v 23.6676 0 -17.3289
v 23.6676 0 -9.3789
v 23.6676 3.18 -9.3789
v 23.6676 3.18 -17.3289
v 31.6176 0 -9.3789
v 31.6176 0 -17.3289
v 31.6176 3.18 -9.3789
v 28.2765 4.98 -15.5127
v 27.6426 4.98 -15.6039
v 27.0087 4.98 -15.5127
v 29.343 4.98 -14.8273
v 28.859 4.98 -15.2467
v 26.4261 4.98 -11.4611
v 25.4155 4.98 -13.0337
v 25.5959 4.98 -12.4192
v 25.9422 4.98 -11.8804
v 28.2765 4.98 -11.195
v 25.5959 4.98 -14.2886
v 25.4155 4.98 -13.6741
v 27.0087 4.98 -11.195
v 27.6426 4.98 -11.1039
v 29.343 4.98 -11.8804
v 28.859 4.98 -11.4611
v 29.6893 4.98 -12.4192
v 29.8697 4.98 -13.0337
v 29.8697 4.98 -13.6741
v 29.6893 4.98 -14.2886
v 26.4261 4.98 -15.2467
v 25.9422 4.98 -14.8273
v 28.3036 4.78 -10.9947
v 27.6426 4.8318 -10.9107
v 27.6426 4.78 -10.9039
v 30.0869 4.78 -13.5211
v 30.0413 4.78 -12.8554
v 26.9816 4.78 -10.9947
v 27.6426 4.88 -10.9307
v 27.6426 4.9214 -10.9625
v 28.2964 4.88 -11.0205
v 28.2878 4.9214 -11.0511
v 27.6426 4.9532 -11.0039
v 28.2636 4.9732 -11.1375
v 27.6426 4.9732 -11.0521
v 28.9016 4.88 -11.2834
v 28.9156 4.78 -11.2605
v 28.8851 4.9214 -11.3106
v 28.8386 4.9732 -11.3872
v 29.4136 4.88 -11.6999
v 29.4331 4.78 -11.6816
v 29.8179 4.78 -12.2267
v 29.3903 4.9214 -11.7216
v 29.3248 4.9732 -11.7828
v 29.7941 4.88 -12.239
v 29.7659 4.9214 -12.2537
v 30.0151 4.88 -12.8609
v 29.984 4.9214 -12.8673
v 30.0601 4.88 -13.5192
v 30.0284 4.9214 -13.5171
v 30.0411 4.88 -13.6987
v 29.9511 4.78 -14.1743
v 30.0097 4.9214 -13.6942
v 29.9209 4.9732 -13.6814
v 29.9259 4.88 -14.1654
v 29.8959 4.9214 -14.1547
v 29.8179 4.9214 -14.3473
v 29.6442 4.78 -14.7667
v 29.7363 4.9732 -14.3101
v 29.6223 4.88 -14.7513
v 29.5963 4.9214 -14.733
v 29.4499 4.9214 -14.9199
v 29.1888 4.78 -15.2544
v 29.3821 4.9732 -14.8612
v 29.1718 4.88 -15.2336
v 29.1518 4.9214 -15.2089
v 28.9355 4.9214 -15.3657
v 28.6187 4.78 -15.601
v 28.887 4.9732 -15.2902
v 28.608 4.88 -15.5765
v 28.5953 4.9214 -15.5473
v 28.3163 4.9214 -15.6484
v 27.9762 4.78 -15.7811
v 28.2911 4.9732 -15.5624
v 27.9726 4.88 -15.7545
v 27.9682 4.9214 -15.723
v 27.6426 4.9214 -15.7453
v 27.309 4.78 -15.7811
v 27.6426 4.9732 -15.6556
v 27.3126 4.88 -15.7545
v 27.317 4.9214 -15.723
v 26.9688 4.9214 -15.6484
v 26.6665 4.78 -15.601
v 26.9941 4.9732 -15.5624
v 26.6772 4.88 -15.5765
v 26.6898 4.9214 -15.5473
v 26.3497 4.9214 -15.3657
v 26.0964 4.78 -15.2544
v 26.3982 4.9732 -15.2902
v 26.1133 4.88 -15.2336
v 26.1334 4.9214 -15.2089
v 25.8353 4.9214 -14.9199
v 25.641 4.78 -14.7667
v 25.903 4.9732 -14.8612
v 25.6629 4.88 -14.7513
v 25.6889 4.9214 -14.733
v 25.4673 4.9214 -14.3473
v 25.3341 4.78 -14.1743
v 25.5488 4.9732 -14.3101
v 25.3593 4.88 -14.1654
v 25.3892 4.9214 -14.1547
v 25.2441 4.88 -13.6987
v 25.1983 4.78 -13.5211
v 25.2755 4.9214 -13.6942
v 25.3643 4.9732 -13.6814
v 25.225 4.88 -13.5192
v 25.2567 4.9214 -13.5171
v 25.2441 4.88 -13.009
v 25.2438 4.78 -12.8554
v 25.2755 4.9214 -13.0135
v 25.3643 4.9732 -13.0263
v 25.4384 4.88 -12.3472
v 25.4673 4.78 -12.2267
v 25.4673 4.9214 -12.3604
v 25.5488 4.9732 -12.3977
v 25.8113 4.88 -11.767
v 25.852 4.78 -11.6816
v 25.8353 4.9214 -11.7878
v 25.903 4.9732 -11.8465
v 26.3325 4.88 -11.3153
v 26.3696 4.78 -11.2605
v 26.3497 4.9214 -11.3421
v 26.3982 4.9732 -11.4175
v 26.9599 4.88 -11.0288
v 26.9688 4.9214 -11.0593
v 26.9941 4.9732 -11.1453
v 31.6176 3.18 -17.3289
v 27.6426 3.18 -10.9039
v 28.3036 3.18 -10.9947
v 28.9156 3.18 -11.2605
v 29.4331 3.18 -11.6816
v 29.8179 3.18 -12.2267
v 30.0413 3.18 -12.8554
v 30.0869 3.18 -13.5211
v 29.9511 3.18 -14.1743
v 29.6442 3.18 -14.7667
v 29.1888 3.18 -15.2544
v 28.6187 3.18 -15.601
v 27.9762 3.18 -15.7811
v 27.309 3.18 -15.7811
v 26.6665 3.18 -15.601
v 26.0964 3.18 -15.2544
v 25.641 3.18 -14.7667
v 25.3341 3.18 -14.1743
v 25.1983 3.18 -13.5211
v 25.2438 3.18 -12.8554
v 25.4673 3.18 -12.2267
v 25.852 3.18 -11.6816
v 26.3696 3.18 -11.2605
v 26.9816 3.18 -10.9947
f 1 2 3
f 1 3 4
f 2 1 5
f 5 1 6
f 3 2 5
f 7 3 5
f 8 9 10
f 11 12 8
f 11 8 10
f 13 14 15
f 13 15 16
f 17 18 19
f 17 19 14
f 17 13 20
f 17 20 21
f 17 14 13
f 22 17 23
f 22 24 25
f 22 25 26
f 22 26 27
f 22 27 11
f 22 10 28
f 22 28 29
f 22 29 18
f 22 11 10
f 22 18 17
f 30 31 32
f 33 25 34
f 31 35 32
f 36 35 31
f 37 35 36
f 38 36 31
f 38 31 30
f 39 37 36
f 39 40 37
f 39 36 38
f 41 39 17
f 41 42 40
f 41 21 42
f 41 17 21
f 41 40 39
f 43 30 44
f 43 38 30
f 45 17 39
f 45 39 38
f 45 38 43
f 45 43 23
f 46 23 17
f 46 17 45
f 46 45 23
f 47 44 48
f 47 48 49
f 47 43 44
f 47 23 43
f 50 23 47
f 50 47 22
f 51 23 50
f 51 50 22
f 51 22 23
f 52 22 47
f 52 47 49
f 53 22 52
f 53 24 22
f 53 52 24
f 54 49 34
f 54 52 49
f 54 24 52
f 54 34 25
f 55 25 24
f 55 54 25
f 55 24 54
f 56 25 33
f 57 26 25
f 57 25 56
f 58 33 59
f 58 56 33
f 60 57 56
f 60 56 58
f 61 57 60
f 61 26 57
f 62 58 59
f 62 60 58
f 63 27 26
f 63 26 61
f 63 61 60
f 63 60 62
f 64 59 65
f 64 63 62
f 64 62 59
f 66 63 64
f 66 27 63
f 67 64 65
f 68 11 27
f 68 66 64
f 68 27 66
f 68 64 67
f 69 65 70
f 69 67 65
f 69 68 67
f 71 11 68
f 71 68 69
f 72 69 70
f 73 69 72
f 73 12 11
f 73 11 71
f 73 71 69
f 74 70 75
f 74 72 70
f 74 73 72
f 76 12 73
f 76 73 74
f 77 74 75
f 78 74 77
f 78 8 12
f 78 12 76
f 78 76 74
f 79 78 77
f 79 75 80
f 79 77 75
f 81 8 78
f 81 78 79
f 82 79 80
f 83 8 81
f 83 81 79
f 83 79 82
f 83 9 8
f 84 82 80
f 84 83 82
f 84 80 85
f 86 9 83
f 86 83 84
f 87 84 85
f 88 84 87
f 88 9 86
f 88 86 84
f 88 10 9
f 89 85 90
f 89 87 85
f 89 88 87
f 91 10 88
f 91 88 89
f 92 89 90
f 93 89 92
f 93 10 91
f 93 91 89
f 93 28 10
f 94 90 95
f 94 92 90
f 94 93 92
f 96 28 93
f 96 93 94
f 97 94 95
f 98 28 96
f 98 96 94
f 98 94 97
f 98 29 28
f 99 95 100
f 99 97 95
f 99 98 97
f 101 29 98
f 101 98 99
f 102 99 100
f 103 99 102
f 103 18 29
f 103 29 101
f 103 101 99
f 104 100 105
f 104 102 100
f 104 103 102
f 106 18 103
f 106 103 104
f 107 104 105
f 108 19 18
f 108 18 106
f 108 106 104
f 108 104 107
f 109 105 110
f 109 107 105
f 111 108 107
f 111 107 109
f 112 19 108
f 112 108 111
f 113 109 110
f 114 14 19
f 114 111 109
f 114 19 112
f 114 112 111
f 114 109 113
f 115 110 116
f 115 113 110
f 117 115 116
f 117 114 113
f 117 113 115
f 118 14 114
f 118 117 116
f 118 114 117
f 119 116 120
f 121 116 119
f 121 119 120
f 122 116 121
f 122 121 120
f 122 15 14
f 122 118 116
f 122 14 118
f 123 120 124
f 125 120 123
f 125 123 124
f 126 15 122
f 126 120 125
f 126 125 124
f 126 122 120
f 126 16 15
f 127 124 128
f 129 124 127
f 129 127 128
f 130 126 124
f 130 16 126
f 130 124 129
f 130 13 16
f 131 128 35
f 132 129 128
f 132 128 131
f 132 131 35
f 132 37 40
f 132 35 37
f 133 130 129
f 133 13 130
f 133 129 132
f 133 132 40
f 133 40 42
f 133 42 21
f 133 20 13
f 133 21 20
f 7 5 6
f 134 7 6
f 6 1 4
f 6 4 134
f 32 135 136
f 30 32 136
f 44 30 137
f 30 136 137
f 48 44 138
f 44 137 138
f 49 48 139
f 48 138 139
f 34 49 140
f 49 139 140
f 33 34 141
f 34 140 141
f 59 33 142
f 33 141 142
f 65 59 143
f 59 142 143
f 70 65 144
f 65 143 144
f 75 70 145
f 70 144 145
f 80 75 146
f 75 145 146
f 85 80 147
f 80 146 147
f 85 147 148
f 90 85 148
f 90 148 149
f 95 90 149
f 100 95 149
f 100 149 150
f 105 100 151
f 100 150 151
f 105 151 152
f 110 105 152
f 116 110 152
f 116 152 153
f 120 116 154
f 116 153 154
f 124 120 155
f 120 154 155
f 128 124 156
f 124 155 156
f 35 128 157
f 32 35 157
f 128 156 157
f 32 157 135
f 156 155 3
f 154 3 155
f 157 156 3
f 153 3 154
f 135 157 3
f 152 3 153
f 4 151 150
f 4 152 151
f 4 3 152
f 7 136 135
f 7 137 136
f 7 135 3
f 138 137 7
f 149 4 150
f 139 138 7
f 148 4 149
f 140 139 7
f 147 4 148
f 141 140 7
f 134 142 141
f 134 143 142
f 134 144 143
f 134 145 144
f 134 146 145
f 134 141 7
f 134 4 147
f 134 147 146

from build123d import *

# Parameters (mm, degrees)
SKETCH_1_W      = 7.95
SKETCH_1_H      = 7.95
EXTRUDE_1_DEPTH = 3.18
SKETCH_2_R      = 2.45
EXTRUDE_2_DEPTH = 1.8
FILLET_1_R      = 0.2


with BuildPart() as part:
    # 草图1 → 凸台-拉伸1 (new body)
    with BuildSketch(Plane(origin=(0, 0, 0), x_dir=(1, 0, 0), z_dir=(0, 1, 0))):
        with Locations((27.642590822, 13.353871893)):
            Rectangle(SKETCH_1_W, SKETCH_1_H)
    extrude(amount=EXTRUDE_1_DEPTH)

    # 草图2 → 凸台-拉伸2 (add)
    with BuildSketch(Plane(origin=(0, 3.18, 0), x_dir=(1, 0, 0), z_dir=(0, 1, 0))):
        with Locations(Location((27.642590822, 13.353871893, 0), (0, 0, 270))):
            Circle(SKETCH_2_R)
    extrude(amount=EXTRUDE_2_DEPTH)

    # 圆角1
    fillet_1_edges = [part.edges().sort_by_distance(p)[0] for p in [
        (27.642590822, 4.98, -15.803871893),
    ]]
    fillet(fillet_1_edges, radius=FILLET_1_R)


solid = part.part
